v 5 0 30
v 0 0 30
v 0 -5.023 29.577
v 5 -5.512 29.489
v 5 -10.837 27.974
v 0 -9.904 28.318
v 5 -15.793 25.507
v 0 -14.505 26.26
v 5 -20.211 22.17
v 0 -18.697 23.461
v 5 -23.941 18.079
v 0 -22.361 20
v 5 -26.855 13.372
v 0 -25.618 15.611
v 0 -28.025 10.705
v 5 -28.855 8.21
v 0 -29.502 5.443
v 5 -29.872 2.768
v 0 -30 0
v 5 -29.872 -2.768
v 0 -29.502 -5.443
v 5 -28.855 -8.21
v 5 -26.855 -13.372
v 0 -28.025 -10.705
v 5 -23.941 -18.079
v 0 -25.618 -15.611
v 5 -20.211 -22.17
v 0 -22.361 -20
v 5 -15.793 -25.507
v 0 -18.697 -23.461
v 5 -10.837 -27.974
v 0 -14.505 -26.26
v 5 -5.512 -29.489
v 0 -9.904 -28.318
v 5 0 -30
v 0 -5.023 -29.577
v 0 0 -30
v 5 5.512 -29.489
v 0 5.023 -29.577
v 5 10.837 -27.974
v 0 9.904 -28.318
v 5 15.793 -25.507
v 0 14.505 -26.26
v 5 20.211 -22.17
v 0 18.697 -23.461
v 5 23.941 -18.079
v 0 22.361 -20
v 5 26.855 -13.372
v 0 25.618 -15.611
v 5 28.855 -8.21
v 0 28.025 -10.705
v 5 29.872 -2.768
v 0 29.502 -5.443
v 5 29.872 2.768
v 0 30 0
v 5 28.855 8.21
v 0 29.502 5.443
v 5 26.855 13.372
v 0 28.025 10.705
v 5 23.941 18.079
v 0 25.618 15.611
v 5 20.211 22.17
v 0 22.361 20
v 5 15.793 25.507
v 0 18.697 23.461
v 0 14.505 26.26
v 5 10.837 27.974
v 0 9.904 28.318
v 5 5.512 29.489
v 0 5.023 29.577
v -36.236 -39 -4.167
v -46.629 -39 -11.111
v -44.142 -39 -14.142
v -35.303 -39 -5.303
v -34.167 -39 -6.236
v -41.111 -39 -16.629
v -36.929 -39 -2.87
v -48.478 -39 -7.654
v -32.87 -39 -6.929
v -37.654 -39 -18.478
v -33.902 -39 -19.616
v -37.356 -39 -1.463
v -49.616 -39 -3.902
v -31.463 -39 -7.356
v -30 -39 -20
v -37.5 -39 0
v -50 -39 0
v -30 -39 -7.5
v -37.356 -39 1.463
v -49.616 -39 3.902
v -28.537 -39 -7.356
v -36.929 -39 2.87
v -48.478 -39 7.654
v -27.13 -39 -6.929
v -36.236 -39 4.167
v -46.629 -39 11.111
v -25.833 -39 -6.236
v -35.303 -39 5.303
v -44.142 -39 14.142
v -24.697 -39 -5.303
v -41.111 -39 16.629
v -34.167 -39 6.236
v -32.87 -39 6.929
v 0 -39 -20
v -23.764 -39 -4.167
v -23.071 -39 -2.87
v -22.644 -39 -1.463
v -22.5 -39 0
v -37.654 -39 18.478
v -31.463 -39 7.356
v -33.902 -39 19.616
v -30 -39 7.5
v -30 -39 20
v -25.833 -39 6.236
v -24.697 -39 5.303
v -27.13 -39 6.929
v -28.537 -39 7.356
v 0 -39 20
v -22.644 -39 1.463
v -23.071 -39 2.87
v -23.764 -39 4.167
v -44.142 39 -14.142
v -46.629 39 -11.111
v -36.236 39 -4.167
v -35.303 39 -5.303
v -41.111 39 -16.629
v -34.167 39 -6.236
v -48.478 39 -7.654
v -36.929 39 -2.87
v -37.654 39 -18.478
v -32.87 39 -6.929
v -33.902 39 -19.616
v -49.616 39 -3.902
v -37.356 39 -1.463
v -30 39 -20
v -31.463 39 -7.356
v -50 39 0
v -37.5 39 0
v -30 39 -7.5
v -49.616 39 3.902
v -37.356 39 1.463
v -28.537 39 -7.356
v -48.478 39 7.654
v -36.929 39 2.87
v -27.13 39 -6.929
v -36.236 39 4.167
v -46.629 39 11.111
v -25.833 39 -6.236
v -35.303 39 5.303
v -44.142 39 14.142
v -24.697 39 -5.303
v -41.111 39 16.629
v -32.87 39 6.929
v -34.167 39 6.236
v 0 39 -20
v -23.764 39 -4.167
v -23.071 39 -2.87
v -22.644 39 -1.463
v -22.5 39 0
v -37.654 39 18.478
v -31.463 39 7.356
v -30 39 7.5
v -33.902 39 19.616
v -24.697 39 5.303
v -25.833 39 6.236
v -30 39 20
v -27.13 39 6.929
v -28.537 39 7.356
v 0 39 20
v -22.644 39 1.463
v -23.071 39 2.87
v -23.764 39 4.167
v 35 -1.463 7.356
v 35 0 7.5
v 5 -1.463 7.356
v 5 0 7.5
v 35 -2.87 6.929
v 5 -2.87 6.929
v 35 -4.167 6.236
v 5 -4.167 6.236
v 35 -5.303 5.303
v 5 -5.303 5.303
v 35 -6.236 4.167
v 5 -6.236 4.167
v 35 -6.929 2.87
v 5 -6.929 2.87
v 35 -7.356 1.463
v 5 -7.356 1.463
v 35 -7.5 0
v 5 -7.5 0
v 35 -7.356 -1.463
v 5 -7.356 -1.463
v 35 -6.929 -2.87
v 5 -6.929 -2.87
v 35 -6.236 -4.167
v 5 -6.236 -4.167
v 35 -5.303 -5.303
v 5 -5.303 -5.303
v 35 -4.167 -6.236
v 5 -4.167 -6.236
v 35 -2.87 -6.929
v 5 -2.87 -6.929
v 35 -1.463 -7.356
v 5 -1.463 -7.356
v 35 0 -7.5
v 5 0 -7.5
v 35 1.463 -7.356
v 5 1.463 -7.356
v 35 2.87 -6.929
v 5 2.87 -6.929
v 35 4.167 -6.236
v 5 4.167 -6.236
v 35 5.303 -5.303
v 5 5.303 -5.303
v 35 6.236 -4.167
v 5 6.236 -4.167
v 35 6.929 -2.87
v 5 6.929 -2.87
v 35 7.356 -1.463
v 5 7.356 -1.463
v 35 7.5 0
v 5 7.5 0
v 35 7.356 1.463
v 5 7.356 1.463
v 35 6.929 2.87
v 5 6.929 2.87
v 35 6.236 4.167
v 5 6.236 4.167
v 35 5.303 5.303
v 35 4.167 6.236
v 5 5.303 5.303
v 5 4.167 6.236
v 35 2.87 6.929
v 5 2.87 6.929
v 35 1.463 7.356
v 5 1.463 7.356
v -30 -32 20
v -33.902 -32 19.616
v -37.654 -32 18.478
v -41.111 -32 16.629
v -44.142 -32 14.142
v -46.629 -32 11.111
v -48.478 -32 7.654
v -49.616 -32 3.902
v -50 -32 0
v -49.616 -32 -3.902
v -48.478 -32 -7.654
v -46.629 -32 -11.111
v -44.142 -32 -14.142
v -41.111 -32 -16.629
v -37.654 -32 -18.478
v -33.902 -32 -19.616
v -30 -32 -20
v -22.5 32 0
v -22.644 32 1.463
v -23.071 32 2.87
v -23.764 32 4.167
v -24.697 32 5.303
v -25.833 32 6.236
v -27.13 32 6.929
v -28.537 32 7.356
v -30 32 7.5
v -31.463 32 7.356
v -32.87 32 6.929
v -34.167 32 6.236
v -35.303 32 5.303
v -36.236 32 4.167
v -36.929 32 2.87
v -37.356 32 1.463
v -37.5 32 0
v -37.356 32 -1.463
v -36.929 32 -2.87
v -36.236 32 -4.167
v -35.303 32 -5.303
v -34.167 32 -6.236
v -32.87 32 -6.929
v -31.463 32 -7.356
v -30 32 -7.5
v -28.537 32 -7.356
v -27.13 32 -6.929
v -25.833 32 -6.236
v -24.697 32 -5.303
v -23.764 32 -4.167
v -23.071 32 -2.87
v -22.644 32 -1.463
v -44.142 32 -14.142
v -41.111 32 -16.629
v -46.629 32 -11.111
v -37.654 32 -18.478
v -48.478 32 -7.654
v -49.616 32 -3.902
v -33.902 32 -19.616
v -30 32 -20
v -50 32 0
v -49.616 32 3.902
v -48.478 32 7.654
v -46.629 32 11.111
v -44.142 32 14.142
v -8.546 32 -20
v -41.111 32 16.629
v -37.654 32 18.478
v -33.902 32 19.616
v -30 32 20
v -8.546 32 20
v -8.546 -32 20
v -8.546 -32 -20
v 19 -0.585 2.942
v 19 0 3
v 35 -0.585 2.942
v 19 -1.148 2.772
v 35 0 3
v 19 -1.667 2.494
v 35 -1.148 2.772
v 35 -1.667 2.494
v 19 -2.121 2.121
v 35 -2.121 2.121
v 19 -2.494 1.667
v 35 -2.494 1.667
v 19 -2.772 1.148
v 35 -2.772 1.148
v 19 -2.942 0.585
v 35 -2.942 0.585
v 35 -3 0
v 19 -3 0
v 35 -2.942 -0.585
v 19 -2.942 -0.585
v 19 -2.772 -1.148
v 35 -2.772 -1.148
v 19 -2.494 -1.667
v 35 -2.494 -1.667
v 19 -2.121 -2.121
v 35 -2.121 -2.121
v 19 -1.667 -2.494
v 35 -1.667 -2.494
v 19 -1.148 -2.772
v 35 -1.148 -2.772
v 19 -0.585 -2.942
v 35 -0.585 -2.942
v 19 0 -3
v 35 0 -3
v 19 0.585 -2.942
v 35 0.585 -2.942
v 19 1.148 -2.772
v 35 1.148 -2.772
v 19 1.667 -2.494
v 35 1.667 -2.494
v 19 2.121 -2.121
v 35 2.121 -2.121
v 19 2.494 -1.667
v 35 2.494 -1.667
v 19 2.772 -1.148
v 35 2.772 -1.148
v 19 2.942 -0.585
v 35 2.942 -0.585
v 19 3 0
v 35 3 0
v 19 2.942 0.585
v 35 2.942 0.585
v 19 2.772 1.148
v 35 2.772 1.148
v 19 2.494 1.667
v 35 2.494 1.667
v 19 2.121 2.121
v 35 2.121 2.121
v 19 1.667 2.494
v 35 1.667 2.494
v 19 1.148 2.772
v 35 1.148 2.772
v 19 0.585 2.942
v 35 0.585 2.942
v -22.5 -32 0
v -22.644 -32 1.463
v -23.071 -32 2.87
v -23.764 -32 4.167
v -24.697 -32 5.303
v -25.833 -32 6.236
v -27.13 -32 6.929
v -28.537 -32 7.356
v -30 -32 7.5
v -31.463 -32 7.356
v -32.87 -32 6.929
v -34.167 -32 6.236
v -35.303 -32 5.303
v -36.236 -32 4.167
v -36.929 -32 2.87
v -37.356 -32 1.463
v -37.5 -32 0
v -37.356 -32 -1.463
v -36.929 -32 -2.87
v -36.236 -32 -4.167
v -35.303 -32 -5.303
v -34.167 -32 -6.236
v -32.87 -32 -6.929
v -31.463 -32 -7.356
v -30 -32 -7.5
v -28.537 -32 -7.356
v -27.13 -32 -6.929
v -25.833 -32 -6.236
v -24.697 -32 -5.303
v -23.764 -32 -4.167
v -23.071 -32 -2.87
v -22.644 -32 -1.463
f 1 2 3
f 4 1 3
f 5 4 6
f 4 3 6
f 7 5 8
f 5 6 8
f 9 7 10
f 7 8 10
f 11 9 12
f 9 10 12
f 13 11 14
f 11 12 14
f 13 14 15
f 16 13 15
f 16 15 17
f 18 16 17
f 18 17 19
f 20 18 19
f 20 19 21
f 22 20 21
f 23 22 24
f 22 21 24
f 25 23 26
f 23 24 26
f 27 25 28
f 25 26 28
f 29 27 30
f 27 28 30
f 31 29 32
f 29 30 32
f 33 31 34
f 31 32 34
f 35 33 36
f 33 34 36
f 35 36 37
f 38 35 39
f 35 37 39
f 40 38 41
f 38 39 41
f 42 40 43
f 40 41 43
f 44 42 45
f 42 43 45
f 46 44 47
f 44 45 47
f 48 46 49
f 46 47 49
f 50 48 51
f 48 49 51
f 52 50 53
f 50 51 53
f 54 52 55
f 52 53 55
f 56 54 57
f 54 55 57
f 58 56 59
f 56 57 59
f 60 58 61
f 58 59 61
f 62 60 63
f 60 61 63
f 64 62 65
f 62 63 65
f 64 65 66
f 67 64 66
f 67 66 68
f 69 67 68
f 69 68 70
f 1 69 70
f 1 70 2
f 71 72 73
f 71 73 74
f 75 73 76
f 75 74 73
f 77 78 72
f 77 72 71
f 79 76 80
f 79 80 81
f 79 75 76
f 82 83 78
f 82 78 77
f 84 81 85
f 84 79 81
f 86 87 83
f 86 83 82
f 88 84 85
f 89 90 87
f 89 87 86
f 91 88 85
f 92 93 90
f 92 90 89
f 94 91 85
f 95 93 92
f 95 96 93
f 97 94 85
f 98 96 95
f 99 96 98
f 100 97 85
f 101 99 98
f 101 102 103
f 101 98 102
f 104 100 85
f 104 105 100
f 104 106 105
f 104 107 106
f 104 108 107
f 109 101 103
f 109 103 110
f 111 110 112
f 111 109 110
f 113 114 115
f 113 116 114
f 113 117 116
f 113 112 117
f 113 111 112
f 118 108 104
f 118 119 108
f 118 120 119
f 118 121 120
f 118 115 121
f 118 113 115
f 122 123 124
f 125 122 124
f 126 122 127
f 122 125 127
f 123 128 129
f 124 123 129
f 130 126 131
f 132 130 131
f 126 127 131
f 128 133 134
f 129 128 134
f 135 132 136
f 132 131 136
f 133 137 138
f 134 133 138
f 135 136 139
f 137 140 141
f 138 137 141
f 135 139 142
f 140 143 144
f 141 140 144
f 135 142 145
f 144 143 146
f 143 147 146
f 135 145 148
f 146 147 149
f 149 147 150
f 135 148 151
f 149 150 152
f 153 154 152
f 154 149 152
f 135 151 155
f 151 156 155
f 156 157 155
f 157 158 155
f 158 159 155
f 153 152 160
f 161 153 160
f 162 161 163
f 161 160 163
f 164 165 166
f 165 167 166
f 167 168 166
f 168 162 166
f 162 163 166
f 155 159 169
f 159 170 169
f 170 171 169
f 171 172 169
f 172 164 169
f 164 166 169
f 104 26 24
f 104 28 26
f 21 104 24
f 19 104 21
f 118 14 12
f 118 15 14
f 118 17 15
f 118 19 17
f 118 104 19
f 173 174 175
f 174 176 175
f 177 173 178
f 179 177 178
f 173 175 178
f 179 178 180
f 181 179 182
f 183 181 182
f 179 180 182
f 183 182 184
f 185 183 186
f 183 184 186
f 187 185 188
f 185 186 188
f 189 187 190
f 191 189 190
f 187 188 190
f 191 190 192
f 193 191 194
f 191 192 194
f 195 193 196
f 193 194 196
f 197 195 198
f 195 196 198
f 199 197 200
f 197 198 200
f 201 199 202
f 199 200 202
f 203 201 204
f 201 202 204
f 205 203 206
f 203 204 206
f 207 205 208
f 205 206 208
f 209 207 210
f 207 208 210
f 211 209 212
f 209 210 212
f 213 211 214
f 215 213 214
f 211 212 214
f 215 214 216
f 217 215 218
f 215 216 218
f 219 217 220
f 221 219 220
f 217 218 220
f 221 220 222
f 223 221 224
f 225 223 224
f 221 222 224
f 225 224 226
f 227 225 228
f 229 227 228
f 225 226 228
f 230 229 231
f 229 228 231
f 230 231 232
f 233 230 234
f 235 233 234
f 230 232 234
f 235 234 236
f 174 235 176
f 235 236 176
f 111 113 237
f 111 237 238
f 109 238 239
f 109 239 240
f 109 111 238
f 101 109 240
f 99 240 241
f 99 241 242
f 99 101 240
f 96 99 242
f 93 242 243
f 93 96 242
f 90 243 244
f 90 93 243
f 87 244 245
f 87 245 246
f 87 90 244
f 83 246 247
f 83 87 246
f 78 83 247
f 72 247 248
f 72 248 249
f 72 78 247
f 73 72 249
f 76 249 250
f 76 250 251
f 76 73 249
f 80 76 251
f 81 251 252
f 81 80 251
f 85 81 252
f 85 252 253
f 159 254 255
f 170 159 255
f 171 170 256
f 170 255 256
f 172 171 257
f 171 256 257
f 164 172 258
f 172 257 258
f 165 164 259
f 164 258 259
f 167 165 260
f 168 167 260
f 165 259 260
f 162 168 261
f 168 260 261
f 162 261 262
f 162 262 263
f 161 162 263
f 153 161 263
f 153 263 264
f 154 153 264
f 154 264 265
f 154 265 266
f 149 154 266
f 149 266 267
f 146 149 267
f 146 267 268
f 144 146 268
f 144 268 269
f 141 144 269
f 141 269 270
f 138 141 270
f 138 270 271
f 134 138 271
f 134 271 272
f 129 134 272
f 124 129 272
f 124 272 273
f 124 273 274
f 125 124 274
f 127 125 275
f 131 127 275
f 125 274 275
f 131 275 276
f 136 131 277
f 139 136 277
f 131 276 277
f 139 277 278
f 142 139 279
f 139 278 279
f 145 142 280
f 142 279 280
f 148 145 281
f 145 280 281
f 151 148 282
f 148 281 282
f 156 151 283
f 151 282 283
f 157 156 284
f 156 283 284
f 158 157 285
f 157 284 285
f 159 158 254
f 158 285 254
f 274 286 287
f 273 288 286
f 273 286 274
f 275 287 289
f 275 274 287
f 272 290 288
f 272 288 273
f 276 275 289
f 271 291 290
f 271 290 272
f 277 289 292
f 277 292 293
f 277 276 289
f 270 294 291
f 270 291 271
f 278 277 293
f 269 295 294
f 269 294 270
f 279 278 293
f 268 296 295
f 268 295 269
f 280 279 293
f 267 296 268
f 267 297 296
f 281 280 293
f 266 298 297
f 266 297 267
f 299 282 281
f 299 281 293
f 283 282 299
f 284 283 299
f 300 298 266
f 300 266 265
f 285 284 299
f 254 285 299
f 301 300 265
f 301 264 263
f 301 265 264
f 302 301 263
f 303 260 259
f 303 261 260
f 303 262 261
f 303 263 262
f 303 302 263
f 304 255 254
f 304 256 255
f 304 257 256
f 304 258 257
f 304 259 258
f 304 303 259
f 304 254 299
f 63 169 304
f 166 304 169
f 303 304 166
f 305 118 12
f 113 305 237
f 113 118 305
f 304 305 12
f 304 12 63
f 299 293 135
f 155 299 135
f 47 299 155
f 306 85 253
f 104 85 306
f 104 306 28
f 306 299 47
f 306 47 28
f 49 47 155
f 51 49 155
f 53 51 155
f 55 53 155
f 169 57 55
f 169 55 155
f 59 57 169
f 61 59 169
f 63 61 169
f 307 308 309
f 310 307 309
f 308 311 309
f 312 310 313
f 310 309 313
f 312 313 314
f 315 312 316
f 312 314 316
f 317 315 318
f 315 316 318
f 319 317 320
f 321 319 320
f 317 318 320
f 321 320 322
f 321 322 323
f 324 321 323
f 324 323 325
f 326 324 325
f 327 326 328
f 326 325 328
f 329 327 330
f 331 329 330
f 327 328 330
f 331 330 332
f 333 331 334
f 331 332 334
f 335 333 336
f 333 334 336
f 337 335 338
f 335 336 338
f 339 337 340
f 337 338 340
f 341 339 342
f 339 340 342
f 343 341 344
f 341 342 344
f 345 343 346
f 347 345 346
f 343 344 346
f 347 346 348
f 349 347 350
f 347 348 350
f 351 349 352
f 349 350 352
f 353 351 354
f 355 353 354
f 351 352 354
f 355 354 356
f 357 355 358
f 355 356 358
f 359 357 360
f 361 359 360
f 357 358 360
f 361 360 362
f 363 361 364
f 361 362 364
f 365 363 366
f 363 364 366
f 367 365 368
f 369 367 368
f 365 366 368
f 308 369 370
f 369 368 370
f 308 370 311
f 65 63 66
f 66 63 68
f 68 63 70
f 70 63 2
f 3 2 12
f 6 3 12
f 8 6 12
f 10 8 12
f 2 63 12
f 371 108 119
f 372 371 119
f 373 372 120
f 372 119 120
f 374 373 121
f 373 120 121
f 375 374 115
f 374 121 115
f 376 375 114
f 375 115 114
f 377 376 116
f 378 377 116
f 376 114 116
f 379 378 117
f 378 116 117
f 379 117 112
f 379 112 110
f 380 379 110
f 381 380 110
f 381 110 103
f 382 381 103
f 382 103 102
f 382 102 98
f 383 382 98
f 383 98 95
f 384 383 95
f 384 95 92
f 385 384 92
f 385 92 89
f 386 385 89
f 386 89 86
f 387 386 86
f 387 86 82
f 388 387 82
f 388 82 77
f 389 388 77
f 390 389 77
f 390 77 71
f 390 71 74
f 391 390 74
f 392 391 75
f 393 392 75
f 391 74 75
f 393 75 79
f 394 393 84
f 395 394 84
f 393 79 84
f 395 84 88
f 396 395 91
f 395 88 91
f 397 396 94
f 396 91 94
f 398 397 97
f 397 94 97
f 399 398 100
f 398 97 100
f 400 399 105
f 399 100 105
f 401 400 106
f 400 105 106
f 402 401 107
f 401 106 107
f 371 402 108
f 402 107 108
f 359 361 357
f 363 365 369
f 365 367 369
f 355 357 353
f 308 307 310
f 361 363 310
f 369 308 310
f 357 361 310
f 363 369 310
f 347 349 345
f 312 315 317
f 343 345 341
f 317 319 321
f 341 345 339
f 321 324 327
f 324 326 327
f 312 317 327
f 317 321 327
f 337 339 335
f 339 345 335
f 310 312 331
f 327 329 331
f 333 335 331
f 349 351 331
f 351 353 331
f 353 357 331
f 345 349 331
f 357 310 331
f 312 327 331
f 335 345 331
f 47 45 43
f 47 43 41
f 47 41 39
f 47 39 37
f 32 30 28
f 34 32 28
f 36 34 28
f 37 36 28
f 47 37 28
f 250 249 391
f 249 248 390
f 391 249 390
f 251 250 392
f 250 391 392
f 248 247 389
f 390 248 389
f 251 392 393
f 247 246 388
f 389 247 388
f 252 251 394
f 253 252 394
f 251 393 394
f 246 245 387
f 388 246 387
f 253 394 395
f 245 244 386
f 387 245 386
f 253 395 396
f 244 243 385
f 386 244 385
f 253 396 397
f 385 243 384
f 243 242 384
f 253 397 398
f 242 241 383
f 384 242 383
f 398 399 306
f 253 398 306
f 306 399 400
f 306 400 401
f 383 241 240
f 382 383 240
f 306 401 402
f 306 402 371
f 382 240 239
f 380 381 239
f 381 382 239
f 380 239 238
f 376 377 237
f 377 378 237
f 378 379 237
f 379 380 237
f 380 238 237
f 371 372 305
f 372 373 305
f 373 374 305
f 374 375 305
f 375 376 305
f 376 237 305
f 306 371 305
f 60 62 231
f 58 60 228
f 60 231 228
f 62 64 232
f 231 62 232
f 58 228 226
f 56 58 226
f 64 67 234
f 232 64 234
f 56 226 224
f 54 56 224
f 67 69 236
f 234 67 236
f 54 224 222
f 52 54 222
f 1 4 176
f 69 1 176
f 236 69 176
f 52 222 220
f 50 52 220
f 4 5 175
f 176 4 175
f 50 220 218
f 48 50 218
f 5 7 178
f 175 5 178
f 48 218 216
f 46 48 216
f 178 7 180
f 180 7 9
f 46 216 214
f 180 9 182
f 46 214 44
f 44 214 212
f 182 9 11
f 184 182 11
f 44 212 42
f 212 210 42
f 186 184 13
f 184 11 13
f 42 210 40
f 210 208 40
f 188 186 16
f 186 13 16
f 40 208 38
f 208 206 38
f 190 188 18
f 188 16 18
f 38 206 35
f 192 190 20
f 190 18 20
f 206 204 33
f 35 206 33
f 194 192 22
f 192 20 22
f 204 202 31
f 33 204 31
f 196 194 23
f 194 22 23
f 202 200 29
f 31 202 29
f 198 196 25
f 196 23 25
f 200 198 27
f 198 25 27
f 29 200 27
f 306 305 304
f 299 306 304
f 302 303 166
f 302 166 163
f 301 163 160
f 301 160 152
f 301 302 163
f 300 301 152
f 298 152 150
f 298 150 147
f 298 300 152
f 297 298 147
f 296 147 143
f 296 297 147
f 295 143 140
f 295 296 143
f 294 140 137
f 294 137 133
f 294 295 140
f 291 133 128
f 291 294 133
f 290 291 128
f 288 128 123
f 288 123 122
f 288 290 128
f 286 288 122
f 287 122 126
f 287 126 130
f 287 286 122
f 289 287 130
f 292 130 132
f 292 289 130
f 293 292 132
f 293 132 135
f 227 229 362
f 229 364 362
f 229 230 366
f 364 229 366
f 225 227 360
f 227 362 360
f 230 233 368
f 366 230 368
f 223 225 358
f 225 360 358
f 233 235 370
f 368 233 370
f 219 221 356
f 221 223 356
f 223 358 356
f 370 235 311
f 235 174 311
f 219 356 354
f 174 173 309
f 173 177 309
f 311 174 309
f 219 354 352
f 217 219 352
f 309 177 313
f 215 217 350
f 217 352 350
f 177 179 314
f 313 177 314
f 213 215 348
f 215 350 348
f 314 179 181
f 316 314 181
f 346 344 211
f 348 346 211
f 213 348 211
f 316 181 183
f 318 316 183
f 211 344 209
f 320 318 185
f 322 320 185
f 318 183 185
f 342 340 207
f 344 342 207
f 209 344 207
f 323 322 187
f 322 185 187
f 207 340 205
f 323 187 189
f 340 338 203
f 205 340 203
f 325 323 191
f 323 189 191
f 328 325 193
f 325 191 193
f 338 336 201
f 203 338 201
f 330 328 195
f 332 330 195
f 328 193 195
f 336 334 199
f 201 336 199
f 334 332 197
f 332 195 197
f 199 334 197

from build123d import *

# Parameters (mm, degrees)
F0_W     = 5
F0_H     = 7.5
F2_DEPTH = 39
F3_W     = 41.4538450539
F3_H     = 32
F4_DEPTH = 50
F5_R     = 7.5
F6_DEPTH = 78.001


with BuildPart() as f1:
    # F0 (on Front) → F1 (revolve)
    with BuildSketch(Plane.XZ):
        Polygon((5, 7.5), (5, 0), (19, 0), (19, 3), (35, 3), (35, 7.5), align=None)
        with Locations((2.5, 3.75)):
            Rectangle(F0_W, F0_H)
        Polygon((0, 20), (0, 7.5), (5, 7.5), (5, 30), (0, 30), align=None)
    revolve(axis=Axis((17.5, 0, 0), (1, 0, 0)))

    # F0 (on Front) → F2 (join, symmetric)
    with BuildSketch(Plane.XZ):
        with BuildLine():
            ThreePointArc((-30, -20), (-15.8578643763, -14.1421356237), (-10, 0))
            ThreePointArc((-10, 0), (-15.8578643763, 14.1421356237), (-30, 20))
            ThreePointArc((-30, 20), (-50, 0), (-30, -20))
        make_face()
        with BuildLine():
            Line((-10, 0), (0, 0))
            Line((0, 0), (0, 7.5))
            Line((0, 7.5), (0, 20))
            Line((0, 20), (-30, 20))
            ThreePointArc((-30, 20), (-15.8578643763, 14.1421356237), (-10, 0))
        make_face()
        with BuildLine():
            Line((0, -7.5), (0, 0))
            Line((0, 0), (-10, 0))
            ThreePointArc((-10, 0), (-15.8578643763, -14.1421356237), (-30, -20))
            Line((-30, -20), (0, -20))
            Line((0, -20), (0, -7.5))
        make_face()
    extrude(amount=F2_DEPTH, both=True)

    # F3 (on Top) → F4 (cut, symmetric)
    with BuildSketch(Plane.XY):
        with Locations((-29.273077473, -16)):
            Rectangle(F3_W, F3_H)
        with Locations((-29.273077473, 16)):
            Rectangle(F3_W, F3_H)
    extrude(amount=F4_DEPTH, both=True, mode=Mode.SUBTRACT)

    # F5 (on face) → F6 (cut, through all)
    with BuildSketch(Plane.XZ.offset(39)):
        with Locations((-30, 0)):
            Circle(F5_R)
    extrude(amount=-F6_DEPTH, mode=Mode.SUBTRACT)


solid = f1.part
